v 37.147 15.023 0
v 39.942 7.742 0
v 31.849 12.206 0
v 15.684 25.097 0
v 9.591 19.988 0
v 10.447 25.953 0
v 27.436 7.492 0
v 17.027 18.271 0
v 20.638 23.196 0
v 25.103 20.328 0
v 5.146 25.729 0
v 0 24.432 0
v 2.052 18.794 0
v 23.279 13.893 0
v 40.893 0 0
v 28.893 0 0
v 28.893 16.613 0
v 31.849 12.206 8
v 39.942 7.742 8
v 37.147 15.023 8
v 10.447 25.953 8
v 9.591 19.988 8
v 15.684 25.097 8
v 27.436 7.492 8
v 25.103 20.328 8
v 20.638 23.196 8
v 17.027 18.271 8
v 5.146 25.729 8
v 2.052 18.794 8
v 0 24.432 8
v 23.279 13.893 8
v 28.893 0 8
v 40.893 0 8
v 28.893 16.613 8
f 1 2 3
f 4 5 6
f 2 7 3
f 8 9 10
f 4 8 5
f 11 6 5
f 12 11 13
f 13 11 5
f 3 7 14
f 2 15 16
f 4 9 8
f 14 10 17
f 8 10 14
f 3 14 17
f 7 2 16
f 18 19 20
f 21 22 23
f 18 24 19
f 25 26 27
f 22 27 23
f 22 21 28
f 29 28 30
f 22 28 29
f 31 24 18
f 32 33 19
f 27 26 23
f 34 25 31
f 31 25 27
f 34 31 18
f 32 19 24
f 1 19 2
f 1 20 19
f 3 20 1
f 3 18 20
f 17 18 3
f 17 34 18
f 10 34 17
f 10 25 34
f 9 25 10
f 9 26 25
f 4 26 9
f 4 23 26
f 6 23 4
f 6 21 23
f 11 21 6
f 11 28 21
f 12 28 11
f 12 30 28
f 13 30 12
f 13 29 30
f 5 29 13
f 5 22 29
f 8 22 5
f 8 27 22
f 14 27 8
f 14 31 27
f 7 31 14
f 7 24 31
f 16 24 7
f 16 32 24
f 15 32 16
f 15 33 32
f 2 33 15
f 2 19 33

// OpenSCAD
$fn = 32;

// ----------------------------------------------------------------------
// Arc stop: segment, 8 mm thick
// ----------------------------------------------------------------------

// --- parameters (mm) ---
profile_height = 8;       // extrusion height
profile_points = 17;      // points of the closed outline

profile = [[40.893, 0], [39.942, 7.742], [37.147, 15.023], [31.849, 12.206], [28.893, 16.613], [25.103, 20.328], [20.638, 23.196], [15.684, 25.097], [10.447, 25.953], [5.146, 25.729], [0, 24.432], [2.052, 18.794], [9.591, 19.988], [17.027, 18.271], [23.279, 13.893], [27.436, 7.492], [28.893, 0]];  // single closed polygon, 17 points, counter clockwise

// --- the one profile operation ---
linear_extrude(height = profile_height) polygon(points = profile);
